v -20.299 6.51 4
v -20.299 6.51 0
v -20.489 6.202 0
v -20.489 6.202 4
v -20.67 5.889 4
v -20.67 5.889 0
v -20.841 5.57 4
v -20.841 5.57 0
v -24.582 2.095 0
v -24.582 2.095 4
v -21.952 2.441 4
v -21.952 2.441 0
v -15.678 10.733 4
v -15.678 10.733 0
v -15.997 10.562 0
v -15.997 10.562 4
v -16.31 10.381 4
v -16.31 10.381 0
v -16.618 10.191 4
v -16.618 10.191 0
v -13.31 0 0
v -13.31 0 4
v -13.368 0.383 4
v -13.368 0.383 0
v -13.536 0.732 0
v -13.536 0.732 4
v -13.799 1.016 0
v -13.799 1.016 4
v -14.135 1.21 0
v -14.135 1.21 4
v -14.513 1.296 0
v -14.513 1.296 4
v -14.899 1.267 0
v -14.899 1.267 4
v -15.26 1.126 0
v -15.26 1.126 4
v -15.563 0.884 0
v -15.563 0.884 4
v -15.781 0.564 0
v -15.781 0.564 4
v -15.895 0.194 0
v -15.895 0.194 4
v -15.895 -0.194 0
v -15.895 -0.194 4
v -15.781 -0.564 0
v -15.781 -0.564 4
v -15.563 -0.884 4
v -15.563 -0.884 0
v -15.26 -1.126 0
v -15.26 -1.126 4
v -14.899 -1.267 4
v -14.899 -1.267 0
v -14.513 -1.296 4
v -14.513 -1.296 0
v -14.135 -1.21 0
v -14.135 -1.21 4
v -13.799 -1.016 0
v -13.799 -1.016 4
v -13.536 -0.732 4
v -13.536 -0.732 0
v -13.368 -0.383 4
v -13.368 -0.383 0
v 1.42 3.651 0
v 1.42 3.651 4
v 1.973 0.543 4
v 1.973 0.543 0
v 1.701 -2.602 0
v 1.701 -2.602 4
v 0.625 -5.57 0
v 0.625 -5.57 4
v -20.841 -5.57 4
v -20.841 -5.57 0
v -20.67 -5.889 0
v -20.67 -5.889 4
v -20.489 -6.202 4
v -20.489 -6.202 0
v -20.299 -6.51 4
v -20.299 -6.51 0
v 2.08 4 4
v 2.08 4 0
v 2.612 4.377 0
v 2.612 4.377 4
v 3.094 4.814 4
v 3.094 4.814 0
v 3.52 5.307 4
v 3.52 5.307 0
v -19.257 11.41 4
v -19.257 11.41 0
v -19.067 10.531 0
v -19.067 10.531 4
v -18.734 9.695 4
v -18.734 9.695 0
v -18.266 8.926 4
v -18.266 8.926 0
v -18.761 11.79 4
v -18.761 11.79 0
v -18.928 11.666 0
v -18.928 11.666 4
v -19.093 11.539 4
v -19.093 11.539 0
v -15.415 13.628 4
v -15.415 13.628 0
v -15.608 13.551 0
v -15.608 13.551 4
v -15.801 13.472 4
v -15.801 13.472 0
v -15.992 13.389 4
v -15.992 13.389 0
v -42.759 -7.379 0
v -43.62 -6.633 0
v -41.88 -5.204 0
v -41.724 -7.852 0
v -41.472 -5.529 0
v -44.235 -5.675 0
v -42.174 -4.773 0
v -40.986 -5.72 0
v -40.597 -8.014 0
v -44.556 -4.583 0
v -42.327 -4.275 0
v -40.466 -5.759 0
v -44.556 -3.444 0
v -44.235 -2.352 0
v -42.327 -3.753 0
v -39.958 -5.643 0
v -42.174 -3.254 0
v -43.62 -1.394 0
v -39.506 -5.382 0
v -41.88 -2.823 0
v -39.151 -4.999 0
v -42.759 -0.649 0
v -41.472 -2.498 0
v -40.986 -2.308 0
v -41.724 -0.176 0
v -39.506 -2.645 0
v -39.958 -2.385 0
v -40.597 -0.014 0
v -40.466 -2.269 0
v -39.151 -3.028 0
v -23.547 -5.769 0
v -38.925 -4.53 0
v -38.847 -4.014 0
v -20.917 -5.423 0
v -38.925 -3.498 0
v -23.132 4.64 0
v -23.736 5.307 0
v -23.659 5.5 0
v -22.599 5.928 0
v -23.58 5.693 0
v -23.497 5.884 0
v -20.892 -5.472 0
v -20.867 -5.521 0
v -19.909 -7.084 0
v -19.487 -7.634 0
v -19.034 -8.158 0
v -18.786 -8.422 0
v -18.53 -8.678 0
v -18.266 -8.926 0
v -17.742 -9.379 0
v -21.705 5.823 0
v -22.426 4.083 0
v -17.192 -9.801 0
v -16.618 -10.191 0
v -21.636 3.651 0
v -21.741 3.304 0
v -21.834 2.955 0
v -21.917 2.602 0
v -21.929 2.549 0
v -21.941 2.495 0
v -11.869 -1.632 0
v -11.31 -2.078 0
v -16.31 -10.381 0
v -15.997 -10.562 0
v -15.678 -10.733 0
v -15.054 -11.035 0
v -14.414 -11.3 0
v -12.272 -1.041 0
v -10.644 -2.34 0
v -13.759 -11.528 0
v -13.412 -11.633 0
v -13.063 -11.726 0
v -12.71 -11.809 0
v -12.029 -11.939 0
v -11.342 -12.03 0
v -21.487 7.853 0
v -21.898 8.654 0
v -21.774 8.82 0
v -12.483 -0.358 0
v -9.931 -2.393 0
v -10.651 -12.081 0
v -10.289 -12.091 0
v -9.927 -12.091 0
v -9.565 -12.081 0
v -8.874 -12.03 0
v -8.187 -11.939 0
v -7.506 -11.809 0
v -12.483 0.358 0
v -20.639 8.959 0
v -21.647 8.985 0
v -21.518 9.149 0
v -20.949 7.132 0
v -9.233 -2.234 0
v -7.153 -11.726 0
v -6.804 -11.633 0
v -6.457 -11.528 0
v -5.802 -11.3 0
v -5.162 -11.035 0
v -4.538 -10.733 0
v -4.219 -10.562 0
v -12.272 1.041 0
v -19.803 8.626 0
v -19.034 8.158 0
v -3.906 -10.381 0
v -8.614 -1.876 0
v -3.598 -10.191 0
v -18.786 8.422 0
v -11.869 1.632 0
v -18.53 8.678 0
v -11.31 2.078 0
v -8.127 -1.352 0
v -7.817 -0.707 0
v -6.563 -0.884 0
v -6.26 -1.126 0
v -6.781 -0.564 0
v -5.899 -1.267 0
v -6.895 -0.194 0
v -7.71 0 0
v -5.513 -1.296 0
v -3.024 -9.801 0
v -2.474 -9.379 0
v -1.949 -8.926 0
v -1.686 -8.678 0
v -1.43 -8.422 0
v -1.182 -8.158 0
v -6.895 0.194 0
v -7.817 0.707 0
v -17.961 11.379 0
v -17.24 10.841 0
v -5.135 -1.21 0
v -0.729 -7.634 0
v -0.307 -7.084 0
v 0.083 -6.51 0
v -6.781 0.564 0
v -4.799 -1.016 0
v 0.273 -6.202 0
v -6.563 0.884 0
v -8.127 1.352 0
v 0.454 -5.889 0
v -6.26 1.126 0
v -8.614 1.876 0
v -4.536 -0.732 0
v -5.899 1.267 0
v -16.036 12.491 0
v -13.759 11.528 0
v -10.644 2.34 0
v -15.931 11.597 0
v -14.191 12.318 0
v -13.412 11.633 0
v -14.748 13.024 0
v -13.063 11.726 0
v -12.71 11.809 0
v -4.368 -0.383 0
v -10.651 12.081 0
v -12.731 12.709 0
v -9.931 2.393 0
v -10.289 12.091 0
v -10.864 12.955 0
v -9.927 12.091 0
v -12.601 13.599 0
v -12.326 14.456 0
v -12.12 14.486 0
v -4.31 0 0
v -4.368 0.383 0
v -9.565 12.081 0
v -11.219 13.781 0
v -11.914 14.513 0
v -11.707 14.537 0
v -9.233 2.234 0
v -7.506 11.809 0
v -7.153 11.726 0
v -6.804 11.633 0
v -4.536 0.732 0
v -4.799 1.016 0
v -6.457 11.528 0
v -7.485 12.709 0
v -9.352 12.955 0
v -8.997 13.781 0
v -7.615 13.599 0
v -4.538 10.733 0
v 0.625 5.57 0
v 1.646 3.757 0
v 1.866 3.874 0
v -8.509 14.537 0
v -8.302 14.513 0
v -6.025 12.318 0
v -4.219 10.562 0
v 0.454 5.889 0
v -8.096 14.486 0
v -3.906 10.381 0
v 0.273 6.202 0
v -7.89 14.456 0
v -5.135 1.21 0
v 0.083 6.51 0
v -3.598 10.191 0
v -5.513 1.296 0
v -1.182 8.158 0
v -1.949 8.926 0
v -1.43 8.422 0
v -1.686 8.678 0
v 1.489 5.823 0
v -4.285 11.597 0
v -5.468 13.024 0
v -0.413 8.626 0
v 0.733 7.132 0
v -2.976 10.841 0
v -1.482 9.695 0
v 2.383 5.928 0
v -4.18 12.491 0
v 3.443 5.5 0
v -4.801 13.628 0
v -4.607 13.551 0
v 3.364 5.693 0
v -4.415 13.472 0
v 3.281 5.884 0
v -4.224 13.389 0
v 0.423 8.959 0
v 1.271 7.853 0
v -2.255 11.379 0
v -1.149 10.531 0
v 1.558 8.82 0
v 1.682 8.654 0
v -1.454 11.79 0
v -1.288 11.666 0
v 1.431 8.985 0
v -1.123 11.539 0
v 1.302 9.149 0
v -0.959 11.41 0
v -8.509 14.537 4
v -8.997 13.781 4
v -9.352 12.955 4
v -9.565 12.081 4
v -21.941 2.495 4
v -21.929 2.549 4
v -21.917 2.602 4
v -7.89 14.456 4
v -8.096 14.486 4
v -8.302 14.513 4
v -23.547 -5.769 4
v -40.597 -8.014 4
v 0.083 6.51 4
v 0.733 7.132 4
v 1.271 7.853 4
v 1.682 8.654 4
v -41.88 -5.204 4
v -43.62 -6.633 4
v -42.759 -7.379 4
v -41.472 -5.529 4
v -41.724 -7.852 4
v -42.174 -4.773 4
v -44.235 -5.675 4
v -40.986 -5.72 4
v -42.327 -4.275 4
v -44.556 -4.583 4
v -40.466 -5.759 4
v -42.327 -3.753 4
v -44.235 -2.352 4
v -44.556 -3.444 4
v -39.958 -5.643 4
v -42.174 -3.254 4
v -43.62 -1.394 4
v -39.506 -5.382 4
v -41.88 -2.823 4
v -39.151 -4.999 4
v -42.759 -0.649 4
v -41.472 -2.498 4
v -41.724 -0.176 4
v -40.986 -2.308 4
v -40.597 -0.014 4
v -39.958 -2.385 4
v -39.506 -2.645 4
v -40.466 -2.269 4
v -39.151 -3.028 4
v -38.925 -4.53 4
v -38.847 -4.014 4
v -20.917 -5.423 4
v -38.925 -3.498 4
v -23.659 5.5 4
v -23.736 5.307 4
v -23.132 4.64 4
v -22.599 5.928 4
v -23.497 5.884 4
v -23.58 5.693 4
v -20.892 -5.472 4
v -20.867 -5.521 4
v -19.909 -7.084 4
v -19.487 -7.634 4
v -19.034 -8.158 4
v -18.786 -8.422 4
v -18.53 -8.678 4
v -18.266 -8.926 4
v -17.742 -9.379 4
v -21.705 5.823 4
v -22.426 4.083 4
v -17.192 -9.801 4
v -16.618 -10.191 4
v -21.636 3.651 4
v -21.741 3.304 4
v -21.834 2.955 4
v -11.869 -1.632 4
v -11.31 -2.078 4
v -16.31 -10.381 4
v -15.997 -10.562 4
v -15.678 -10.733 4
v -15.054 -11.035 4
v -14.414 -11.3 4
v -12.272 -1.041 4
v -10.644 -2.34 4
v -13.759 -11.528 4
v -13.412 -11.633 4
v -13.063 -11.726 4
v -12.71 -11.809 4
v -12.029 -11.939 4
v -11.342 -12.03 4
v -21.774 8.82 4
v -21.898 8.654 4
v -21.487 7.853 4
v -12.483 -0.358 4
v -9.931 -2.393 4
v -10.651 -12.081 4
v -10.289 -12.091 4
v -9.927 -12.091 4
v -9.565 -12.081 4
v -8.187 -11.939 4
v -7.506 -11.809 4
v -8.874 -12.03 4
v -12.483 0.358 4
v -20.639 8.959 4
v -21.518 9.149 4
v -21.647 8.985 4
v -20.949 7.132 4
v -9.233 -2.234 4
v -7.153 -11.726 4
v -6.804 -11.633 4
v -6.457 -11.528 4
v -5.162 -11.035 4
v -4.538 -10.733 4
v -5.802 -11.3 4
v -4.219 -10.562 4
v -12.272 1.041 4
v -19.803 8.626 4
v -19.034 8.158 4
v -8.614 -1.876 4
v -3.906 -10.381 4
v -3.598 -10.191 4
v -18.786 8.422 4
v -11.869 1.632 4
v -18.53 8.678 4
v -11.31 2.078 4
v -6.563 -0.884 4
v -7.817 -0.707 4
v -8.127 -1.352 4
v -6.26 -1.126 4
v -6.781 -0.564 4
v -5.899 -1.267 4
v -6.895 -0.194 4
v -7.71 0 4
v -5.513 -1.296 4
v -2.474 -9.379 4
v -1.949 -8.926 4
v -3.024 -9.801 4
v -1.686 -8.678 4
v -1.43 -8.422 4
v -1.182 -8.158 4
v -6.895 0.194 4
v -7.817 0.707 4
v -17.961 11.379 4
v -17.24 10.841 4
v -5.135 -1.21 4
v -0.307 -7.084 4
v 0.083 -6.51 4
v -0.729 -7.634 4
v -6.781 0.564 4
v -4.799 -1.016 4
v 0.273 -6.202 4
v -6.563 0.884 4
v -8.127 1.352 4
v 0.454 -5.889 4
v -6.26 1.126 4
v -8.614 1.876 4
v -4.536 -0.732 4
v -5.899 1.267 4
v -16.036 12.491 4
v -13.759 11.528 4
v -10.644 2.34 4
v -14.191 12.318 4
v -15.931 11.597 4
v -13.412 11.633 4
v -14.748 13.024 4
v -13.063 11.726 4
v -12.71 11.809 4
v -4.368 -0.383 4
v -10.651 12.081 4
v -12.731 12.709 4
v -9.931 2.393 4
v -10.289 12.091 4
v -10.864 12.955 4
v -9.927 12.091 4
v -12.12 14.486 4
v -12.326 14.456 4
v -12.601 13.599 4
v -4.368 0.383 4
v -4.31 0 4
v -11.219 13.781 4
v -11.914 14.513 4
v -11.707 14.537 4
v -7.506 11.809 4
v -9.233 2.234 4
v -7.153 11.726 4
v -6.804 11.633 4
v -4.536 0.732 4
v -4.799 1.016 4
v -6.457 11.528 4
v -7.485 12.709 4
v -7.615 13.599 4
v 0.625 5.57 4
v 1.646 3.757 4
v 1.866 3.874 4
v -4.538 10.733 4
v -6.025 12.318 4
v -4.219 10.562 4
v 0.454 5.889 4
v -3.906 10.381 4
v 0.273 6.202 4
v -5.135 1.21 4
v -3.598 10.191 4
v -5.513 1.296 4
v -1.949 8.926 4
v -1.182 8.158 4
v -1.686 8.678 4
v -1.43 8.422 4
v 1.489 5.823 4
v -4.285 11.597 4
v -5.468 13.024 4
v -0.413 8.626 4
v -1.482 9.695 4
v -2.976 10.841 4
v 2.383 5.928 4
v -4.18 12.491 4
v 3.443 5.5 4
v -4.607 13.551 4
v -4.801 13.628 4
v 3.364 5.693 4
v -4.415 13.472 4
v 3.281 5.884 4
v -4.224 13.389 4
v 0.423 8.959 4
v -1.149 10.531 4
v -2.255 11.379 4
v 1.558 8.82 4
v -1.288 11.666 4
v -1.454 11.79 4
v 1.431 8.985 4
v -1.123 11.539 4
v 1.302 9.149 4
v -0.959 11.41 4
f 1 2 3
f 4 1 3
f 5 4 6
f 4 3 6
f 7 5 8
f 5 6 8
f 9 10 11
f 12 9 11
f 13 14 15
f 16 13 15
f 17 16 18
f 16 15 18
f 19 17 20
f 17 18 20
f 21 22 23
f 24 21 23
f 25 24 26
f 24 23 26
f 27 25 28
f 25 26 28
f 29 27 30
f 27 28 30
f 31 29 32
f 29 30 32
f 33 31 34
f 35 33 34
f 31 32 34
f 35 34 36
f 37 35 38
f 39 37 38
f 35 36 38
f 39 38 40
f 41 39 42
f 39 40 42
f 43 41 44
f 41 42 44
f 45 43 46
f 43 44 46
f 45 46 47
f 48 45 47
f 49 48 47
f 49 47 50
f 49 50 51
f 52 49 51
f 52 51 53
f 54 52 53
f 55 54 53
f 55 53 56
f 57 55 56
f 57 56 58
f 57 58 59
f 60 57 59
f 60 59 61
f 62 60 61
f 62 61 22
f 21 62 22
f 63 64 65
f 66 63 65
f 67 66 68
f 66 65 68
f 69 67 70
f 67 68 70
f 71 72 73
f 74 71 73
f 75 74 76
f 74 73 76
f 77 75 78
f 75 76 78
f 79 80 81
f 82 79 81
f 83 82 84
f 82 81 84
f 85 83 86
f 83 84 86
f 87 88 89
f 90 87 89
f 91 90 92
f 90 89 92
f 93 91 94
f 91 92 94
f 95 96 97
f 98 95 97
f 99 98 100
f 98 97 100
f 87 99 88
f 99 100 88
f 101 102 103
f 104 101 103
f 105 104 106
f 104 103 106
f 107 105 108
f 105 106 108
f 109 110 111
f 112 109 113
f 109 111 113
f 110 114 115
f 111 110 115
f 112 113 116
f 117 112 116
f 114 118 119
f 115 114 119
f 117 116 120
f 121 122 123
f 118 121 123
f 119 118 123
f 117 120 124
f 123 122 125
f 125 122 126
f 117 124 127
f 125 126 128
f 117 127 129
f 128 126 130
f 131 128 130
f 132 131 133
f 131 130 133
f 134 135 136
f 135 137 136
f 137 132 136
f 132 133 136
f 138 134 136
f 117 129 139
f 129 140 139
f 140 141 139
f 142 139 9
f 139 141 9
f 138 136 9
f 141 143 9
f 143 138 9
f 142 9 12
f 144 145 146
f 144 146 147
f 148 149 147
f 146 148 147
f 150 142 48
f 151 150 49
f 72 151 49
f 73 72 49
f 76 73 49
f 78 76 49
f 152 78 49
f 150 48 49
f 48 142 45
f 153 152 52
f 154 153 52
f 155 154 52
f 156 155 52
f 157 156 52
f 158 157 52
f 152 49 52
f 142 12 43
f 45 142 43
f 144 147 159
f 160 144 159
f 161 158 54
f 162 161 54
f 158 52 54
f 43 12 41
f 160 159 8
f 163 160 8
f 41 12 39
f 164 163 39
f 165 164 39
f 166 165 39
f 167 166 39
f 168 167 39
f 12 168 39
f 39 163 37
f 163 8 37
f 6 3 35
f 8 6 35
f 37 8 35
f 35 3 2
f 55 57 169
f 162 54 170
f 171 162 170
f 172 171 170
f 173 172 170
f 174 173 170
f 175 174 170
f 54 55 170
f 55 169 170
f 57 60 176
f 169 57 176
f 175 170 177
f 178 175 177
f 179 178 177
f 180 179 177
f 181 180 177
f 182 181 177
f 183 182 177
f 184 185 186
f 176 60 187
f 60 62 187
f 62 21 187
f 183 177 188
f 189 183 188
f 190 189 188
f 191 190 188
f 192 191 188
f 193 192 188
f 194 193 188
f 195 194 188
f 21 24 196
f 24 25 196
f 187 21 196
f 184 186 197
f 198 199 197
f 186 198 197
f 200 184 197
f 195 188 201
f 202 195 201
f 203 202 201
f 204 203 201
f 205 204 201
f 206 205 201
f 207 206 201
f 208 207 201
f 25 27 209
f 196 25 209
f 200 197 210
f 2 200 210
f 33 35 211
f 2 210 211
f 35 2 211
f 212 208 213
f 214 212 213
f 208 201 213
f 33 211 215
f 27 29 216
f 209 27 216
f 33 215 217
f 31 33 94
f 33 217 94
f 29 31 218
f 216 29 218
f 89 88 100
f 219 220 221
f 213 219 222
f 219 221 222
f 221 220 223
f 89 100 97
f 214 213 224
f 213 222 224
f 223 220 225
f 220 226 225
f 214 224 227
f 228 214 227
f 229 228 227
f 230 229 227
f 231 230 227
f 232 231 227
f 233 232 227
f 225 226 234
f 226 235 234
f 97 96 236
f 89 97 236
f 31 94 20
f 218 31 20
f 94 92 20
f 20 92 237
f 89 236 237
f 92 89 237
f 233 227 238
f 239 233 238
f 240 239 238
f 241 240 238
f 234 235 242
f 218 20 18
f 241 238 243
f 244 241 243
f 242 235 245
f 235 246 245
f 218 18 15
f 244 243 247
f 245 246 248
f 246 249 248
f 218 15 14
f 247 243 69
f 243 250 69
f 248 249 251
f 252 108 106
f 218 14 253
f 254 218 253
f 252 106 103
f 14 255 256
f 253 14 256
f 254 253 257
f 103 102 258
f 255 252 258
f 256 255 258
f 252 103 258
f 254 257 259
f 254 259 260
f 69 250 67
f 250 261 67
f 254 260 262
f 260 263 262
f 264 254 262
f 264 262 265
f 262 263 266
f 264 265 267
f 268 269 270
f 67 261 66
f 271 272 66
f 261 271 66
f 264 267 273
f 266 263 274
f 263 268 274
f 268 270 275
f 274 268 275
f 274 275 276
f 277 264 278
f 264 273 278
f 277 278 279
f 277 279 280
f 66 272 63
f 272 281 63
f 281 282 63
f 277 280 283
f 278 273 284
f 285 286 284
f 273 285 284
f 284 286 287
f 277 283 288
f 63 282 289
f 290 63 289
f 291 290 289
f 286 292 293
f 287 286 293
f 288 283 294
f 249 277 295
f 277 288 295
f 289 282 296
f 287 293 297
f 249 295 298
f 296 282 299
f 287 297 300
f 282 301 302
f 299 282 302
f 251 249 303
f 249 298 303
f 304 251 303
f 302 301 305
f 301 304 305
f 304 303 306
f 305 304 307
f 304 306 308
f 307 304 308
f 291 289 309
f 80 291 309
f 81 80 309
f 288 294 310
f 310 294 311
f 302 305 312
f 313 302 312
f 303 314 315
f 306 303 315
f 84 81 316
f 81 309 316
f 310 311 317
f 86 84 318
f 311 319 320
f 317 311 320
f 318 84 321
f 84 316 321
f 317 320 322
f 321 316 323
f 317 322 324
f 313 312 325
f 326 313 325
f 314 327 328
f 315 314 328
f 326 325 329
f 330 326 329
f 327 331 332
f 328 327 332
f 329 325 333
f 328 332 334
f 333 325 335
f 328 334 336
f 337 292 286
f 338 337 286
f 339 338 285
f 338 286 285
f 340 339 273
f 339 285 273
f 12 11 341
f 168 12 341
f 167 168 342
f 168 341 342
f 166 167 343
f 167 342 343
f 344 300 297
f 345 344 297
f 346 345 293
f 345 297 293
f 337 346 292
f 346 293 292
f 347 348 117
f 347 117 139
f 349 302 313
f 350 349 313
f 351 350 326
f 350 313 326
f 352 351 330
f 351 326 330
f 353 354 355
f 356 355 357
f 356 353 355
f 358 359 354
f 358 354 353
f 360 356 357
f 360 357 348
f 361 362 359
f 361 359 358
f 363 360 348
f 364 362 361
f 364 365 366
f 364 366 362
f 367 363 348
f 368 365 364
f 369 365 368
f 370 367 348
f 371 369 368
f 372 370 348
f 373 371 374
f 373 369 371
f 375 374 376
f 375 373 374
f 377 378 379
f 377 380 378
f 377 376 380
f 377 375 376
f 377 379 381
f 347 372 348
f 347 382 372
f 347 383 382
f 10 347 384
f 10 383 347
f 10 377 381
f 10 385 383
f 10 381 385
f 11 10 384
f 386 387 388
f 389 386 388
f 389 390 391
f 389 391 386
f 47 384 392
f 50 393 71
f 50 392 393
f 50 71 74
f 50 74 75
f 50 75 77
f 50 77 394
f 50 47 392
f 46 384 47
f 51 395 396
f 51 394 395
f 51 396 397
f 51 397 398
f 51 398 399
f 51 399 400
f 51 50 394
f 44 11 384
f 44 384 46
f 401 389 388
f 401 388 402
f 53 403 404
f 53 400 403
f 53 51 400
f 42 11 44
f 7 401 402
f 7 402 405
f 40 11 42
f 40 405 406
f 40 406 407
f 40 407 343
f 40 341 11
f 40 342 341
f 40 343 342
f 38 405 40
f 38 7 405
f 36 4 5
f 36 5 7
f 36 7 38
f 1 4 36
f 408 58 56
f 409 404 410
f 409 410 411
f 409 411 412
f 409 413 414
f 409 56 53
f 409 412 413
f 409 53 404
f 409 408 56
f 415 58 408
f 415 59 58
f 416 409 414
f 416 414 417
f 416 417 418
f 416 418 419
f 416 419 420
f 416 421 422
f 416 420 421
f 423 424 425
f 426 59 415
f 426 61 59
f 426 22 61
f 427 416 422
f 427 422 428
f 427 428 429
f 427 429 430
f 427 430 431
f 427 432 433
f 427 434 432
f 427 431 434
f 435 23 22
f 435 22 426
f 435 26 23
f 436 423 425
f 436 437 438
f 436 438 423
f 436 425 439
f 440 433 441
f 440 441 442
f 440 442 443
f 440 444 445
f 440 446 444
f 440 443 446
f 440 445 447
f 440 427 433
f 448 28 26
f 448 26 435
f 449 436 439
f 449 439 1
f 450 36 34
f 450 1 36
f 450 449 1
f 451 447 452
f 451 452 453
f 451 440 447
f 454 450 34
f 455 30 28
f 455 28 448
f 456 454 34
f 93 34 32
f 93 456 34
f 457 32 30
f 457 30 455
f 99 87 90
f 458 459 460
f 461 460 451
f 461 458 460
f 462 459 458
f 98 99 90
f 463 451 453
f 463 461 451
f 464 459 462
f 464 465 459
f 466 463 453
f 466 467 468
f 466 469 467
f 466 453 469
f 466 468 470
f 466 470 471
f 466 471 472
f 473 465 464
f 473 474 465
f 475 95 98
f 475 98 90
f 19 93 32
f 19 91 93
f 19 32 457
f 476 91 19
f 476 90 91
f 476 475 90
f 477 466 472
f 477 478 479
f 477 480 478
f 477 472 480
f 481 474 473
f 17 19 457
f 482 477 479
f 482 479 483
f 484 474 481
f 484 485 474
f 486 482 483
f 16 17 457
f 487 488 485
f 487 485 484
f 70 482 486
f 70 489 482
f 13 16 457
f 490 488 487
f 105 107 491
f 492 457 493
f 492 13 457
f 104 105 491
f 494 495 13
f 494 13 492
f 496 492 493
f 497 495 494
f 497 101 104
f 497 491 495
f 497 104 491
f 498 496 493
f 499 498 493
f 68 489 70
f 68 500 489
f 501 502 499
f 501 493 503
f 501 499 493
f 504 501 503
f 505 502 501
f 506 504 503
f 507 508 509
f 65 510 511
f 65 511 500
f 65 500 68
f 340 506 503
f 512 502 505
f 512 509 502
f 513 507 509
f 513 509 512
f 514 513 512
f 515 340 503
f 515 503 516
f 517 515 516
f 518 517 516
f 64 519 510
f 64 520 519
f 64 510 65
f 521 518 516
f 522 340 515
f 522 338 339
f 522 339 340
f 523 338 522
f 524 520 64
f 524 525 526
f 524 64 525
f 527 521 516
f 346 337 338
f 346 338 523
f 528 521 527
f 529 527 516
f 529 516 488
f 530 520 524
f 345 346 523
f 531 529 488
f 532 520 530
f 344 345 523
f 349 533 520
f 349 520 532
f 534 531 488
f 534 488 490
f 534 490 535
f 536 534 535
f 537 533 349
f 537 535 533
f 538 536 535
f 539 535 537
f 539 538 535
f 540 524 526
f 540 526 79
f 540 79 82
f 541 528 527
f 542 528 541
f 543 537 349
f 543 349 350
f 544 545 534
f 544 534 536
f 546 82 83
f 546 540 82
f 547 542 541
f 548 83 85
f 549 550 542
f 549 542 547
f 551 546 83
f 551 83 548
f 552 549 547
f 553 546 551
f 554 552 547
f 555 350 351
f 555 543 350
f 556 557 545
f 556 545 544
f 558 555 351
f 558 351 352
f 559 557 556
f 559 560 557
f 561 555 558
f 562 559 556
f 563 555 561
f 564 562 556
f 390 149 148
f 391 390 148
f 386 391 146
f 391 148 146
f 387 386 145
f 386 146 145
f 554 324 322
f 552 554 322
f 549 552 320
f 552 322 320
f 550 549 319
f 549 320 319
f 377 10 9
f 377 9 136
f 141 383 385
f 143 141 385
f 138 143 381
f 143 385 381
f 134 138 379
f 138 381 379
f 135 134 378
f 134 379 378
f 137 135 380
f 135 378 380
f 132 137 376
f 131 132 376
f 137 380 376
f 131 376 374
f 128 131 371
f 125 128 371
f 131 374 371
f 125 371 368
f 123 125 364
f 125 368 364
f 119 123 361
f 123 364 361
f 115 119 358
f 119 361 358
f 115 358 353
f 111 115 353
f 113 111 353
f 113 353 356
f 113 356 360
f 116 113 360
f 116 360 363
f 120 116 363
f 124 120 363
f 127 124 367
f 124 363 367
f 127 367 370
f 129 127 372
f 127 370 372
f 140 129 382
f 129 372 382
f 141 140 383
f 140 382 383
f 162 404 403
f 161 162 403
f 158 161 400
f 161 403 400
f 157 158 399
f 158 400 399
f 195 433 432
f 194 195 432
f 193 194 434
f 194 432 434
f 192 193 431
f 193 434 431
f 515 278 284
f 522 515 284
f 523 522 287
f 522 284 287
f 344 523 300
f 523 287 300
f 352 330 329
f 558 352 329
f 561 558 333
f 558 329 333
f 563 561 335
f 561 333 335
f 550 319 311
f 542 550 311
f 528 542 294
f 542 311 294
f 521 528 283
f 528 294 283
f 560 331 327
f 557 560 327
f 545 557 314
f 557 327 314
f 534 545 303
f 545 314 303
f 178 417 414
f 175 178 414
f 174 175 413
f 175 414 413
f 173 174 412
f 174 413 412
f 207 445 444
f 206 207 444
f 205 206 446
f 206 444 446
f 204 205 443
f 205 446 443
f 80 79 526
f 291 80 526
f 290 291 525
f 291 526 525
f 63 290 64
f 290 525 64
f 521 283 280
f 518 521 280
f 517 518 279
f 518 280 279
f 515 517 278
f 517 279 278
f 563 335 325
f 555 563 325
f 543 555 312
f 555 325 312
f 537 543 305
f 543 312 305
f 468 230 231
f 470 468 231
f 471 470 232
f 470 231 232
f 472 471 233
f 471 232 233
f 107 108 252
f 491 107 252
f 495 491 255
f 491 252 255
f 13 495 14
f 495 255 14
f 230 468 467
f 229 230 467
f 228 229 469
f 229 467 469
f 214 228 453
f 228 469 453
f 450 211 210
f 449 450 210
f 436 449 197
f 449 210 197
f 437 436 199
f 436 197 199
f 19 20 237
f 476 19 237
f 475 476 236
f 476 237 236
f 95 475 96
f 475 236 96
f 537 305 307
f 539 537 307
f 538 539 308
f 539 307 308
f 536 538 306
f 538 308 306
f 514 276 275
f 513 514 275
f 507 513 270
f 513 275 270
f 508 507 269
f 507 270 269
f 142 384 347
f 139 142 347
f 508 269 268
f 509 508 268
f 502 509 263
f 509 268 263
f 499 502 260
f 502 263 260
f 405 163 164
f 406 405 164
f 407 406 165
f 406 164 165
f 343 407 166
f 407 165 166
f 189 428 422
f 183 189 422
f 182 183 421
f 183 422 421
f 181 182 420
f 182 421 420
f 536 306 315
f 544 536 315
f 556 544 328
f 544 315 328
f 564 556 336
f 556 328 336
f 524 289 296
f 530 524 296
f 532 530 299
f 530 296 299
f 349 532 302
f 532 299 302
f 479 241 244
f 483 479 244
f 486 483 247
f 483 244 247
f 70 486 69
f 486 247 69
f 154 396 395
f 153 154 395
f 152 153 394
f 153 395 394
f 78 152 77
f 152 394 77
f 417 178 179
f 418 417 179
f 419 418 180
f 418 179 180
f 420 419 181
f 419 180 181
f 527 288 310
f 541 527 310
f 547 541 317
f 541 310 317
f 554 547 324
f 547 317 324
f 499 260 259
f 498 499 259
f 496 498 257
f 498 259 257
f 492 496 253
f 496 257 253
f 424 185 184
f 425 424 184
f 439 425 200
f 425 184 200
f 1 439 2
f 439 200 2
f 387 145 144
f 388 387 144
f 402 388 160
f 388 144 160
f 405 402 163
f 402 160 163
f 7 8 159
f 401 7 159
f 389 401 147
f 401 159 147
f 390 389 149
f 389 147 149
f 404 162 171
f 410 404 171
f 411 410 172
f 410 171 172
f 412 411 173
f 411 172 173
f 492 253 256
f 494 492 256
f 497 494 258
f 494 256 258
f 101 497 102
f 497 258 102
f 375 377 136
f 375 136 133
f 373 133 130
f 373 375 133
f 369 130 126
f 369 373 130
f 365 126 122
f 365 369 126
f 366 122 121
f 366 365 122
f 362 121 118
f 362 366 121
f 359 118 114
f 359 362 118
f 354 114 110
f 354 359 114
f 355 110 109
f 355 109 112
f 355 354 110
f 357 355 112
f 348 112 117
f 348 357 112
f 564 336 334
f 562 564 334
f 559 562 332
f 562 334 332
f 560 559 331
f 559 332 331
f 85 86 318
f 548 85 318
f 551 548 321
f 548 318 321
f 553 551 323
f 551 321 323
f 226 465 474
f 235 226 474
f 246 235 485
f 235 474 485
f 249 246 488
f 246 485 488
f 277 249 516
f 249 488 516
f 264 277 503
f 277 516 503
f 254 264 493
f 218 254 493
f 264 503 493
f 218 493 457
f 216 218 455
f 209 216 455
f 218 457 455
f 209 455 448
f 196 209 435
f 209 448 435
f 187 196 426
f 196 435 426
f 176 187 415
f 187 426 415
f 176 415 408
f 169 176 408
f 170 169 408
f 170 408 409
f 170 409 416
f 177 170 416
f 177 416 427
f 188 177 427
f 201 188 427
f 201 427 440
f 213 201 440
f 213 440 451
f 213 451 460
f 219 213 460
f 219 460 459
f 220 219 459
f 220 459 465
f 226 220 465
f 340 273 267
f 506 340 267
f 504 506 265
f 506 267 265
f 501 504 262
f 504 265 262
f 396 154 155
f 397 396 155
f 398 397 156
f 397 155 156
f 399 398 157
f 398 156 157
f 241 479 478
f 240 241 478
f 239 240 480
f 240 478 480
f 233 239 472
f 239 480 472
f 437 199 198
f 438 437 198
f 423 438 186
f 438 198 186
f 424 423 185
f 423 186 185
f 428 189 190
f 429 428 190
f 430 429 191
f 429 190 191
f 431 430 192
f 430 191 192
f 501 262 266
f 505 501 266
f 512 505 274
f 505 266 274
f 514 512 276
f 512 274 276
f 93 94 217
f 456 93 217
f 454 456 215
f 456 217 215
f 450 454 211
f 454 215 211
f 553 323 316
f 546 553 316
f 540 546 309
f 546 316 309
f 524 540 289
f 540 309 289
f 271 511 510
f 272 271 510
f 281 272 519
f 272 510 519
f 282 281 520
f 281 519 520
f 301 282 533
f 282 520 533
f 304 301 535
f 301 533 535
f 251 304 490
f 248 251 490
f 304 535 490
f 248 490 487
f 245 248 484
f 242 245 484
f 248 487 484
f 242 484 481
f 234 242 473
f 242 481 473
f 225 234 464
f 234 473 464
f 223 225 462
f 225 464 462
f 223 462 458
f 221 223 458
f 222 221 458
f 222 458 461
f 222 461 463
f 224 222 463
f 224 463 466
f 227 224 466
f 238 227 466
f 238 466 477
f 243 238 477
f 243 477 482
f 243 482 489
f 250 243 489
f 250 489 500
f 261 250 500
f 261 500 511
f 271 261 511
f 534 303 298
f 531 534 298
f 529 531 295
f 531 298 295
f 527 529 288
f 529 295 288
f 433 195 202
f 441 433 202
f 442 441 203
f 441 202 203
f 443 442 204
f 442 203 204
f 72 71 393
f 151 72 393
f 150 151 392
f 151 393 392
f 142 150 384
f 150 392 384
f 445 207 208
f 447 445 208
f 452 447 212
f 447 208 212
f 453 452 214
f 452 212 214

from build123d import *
from build123d.topology import SkipClean

# Parameters (mm, degrees)
SKETCH1_R           = 1.5
BOSS_EXTRUDE1_DEPTH = 4
SKETCH2_R           = 1.75
BOSS_EXTRUDE2_DEPTH = 4
CUT_EXTRUDE1_DEPTH  = 48.07674207
SKETCH4_R           = 2.4
SKETCH4_R_2         = 1.3
CUT_EXTRUDE2_DEPTH  = 48.07674207


with BuildPart() as part:
    # Sketch1 → Boss-Extrude1 (new body)
    with BuildSketch(Plane.XY):
        with BuildLine():
            Line((20.64, 4), (2.08, 4))
            ThreePointArc((2.08, 4), (2.859386397, 4.588201733), (3.5201075, 5.30713988))
            ThreePointArc((3.5201075, 5.30713988), (3.403753673, 5.596745198), (3.281246369, 5.883801663))
            ThreePointArc((3.281246369, 5.883801663), (1.933634043, 5.894040025), (0.625453025, 5.57027124))
            ThreePointArc((0.625453025, 5.57027124), (0.364644212, 6.046375), (0.082730667, 6.510293938))
            ThreePointArc((0.082730667, 6.510293938), (1.017213169, 7.48132754), (1.68215265, 8.65351323))
            ThreePointArc((1.68215265, 8.65351323), (1.494808112, 8.903135899), (1.302179463, 9.148703928))
            ThreePointArc((1.302179463, 9.148703928), (-0.002163969, 8.809805691), (-1.181972273, 8.158486898))
            ThreePointArc((-1.181972273, 8.158486898), (-1.557118962, 8.550865528), (-1.949497592, 8.926012217))
            ThreePointArc((-1.949497592, 8.926012217), (-1.298178799, 10.105820521), (-0.959280562, 11.410163953))
            ThreePointArc((-0.959280562, 11.410163953), (-1.204848591, 11.602792602), (-1.45447126, 11.79013714))
            ThreePointArc((-1.45447126, 11.79013714), (-2.62665695, 11.125197659), (-3.597690552, 10.190715157))
            ThreePointArc((-3.597690552, 10.190715157), (-4.06160949, 10.472628702), (-4.53771325, 10.733437515))
            ThreePointArc((-4.53771325, 10.733437515), (-4.213944465, 12.041618533), (-4.224182827, 13.389230859))
            ThreePointArc((-4.224182827, 13.389230859), (-4.511239292, 13.511738163), (-4.80084461, 13.62809199))
            ThreePointArc((-4.80084461, 13.62809199), (-5.760990039, 12.682425791), (-6.457074605, 11.528463019))
            ThreePointArc((-6.457074605, 11.528463019), (-6.978150482, 11.680699536), (-7.505533688, 11.809396783))
            ThreePointArc((-7.505533688, 11.809396783), (-7.531379219, 13.156800143), (-7.890056453, 14.455843809))
            ThreePointArc((-7.890056453, 14.455843809), (-8.199038929, 14.499881098), (-8.508890771, 14.537314892))
            ThreePointArc((-8.508890771, 14.537314892), (-9.191563616, 13.375367565), (-9.565262132, 12.080565177))
            ThreePointArc((-9.565262132, 12.080565177), (-10.10798449, 12.09275), (-10.650706848, 12.080565177))
            ThreePointArc((-10.650706848, 12.080565177), (-11.024405364, 13.375367565), (-11.707078209, 14.537314892))
            ThreePointArc((-11.707078209, 14.537314892), (-12.016930051, 14.499881098), (-12.325912527, 14.455843809))
            ThreePointArc((-12.325912527, 14.455843809), (-12.684589761, 13.156800143), (-12.710435292, 11.809396783))
            ThreePointArc((-12.710435292, 11.809396783), (-13.237818498, 11.680699536), (-13.758894375, 11.528463019))
            ThreePointArc((-13.758894375, 11.528463019), (-14.454978941, 12.682425791), (-15.41512437, 13.62809199))
            ThreePointArc((-15.41512437, 13.62809199), (-15.704729688, 13.511738163), (-15.991786153, 13.389230859))
            ThreePointArc((-15.991786153, 13.389230859), (-16.002024515, 12.041618533), (-15.67825573, 10.733437515))
            ThreePointArc((-15.67825573, 10.733437515), (-16.15435949, 10.472628702), (-16.618278428, 10.190715157))
            ThreePointArc((-16.618278428, 10.190715157), (-17.58931203, 11.125197659), (-18.76149772, 11.79013714))
            ThreePointArc((-18.76149772, 11.79013714), (-19.011120389, 11.602792602), (-19.256688418, 11.410163953))
            ThreePointArc((-19.256688418, 11.410163953), (-18.917790181, 10.105820521), (-18.266471388, 8.926012217))
            ThreePointArc((-18.266471388, 8.926012217), (-18.658850018, 8.550865528), (-19.033996707, 8.158486898))
            ThreePointArc((-19.033996707, 8.158486898), (-20.213805011, 8.809805691), (-21.518148443, 9.148703928))
            ThreePointArc((-21.518148443, 9.148703928), (-21.710777092, 8.903135899), (-21.89812163, 8.65351323))
            ThreePointArc((-21.89812163, 8.65351323), (-21.233182149, 7.48132754), (-20.298699647, 6.510293938))
            ThreePointArc((-20.298699647, 6.510293938), (-20.580613192, 6.046375), (-20.841422005, 5.57027124))
            ThreePointArc((-20.841422005, 5.57027124), (-22.149603023, 5.894040025), (-23.497215349, 5.883801663))
            ThreePointArc((-23.497215349, 5.883801663), (-23.619722653, 5.596745198), (-23.73607648, 5.30713988))
            ThreePointArc((-23.73607648, 5.30713988), (-22.790410282, 4.346994451), (-21.636447509, 3.650909885))
            ThreePointArc((-21.636447509, 3.650909885), (-21.788684026, 3.129834008), (-21.917381273, 2.602450802))
            ThreePointArc((-21.917381273, 2.602450802), (-23.264784633, 2.576605271), (-24.563828299, 2.217928037))
            ThreePointArc((-24.563828299, 2.217928037), (-24.607865588, 1.908945561), (-24.645299382, 1.599093719))
            ThreePointArc((-24.645299382, 1.599093719), (-23.483352055, 0.916420874), (-22.188549667, 0.542722358))
            ThreePointArc((-22.188549667, 0.542722358), (-22.20073449, 0), (-22.188549667, -0.542722358))
            ThreePointArc((-22.188549667, -0.542722358), (-23.483352055, -0.916420874), (-24.645299382, -1.599093719))
            ThreePointArc((-24.645299382, -1.599093719), (-24.607865588, -1.908945561), (-24.563828299, -2.217928037))
            ThreePointArc((-24.563828299, -2.217928037), (-23.264784633, -2.576605271), (-21.917381273, -2.602450802))
            ThreePointArc((-21.917381273, -2.602450802), (-21.788684026, -3.129834008), (-21.636447509, -3.650909885))
            ThreePointArc((-21.636447509, -3.650909885), (-22.790410282, -4.346994451), (-23.73607648, -5.30713988))
            ThreePointArc((-23.73607648, -5.30713988), (-23.619722653, -5.596745198), (-23.497215349, -5.883801663))
            ThreePointArc((-23.497215349, -5.883801663), (-22.149603023, -5.894040025), (-20.841422005, -5.57027124))
            ThreePointArc((-20.841422005, -5.57027124), (-20.580613192, -6.046375), (-20.298699647, -6.510293938))
            ThreePointArc((-20.298699647, -6.510293938), (-21.233182149, -7.48132754), (-21.89812163, -8.65351323))
            ThreePointArc((-21.89812163, -8.65351323), (-21.710777092, -8.903135899), (-21.518148443, -9.148703928))
            ThreePointArc((-21.518148443, -9.148703928), (-20.213805011, -8.809805691), (-19.033996707, -8.158486898))
            ThreePointArc((-19.033996707, -8.158486898), (-18.658850018, -8.550865528), (-18.266471388, -8.926012217))
            ThreePointArc((-18.266471388, -8.926012217), (-18.917790181, -10.105820521), (-19.256688418, -11.410163953))
            ThreePointArc((-19.256688418, -11.410163953), (-19.011120389, -11.602792602), (-18.76149772, -11.79013714))
            ThreePointArc((-18.76149772, -11.79013714), (-17.58931203, -11.125197659), (-16.618278428, -10.190715157))
            ThreePointArc((-16.618278428, -10.190715157), (-16.15435949, -10.472628702), (-15.67825573, -10.733437515))
            ThreePointArc((-15.67825573, -10.733437515), (-16.002024515, -12.041618533), (-15.991786153, -13.389230859))
            ThreePointArc((-15.991786153, -13.389230859), (-15.704729688, -13.511738163), (-15.41512437, -13.62809199))
            ThreePointArc((-15.41512437, -13.62809199), (-14.454978941, -12.682425791), (-13.758894375, -11.528463019))
            ThreePointArc((-13.758894375, -11.528463019), (-13.237818498, -11.680699536), (-12.710435292, -11.809396783))
            ThreePointArc((-12.710435292, -11.809396783), (-12.684589761, -13.156800143), (-12.325912527, -14.455843809))
            ThreePointArc((-12.325912527, -14.455843809), (-12.016930051, -14.499881098), (-11.707078209, -14.537314892))
            ThreePointArc((-11.707078209, -14.537314892), (-11.024405364, -13.375367565), (-10.650706848, -12.080565177))
            ThreePointArc((-10.650706848, -12.080565177), (-10.10798449, -12.09275), (-9.565262132, -12.080565177))
            ThreePointArc((-9.565262132, -12.080565177), (-9.191563616, -13.375367565), (-8.508890771, -14.537314892))
            ThreePointArc((-8.508890771, -14.537314892), (-8.199038929, -14.499881098), (-7.890056453, -14.455843809))
            ThreePointArc((-7.890056453, -14.455843809), (-7.531379219, -13.156800143), (-7.505533688, -11.809396783))
            ThreePointArc((-7.505533688, -11.809396783), (-6.978150482, -11.680699536), (-6.457074605, -11.528463019))
            ThreePointArc((-6.457074605, -11.528463019), (-5.760990039, -12.682425791), (-4.80084461, -13.62809199))
            ThreePointArc((-4.80084461, -13.62809199), (-4.511239292, -13.511738163), (-4.224182827, -13.389230859))
            ThreePointArc((-4.224182827, -13.389230859), (-4.213944465, -12.041618533), (-4.53771325, -10.733437515))
            ThreePointArc((-4.53771325, -10.733437515), (-4.06160949, -10.472628702), (-3.597690552, -10.190715157))
            ThreePointArc((-3.597690552, -10.190715157), (-2.62665695, -11.125197659), (-1.45447126, -11.79013714))
            ThreePointArc((-1.45447126, -11.79013714), (-1.204848591, -11.602792602), (-0.959280562, -11.410163953))
            ThreePointArc((-0.959280562, -11.410163953), (-1.298178799, -10.105820521), (-1.949497592, -8.926012217))
            ThreePointArc((-1.949497592, -8.926012217), (-1.557118962, -8.550865528), (-1.181972273, -8.158486898))
            ThreePointArc((-1.181972273, -8.158486898), (-0.002163969, -8.809805691), (1.302179463, -9.148703928))
            ThreePointArc((1.302179463, -9.148703928), (1.494808112, -8.903135899), (1.68215265, -8.65351323))
            ThreePointArc((1.68215265, -8.65351323), (1.017213169, -7.48132754), (0.082730667, -6.510293938))
            ThreePointArc((0.082730667, -6.510293938), (0.364644212, -6.046375), (0.625453025, -5.57027124))
            ThreePointArc((0.625453025, -5.57027124), (1.933634043, -5.894040025), (3.281246369, -5.883801663))
            ThreePointArc((3.281246369, -5.883801663), (3.403753673, -5.596745198), (3.5201075, -5.30713988))
            ThreePointArc((3.5201075, -5.30713988), (2.859386397, -4.588201733), (2.08, -4))
            Line((2.08, -4), (20.64, -4))
            ThreePointArc((20.64, -4), (24.64, 0), (20.64, 4))
        make_face()
        with Locations((-10.11, 0)):
            Circle(SKETCH1_R, mode=Mode.SUBTRACT)
        with Locations((20.64, 0)):
            Circle(SKETCH1_R, mode=Mode.SUBTRACT)
    extrude(amount=BOSS_EXTRUDE1_DEPTH)

    # Sketch2 → Boss-Extrude2 (add)
    with BuildSketch(Plane.XY.offset(4)):
        with BuildLine():
            ThreePointArc((-10.11, -4), (-14.075779445, -0.522104769), (-11.14527618, 3.863703305))
            Line((-11.14527618, 3.863703305), (-40.596929487, -0.013680411))
            ThreePointArc((-40.596929487, -0.013680411), (-44.596929487, -4.013680411), (-40.596929487, -8.013680411))
            Line((-40.596929487, -8.013680411), (-10.11, -4))
        make_face()
        with Locations((-40.596929487, -4.013680411)):
            Circle(SKETCH2_R, mode=Mode.SUBTRACT)
    extrude(amount=-BOSS_EXTRUDE2_DEPTH)

    # Sketch3 → Cut-Extrude1 (cut, through all)
    with SkipClean():  # the faces are left unmerged after this step: merging them gives an invalid solid
        with BuildSketch(Plane.XY.offset(4)):
            with BuildLine():
                ThreePointArc((-24.563828299, 2.217928037), (-24.573144452, 2.156333064), (-24.582198156, 2.094698967))
                Line((-24.582198156, 2.094698967), (-21.951807297, 2.440996493))
                ThreePointArc((-21.951807297, 2.440996493), (-21.934869799, 2.521782394), (-21.917381273, 2.602450802))
                ThreePointArc((-21.917381273, 2.602450802), (-23.264784633, 2.576605271), (-24.563828299, 2.217928037))
            make_face()
            with BuildLine():
                ThreePointArc((-20.841422005, -5.57027124), (-20.879319726, -5.496629859), (-20.916712206, -5.422730653))
                Line((-20.916712206, -5.422730653), (-23.547068935, -5.769023686))
                ThreePointArc((-23.547068935, -5.769023686), (-23.522264903, -5.826465995), (-23.497215349, -5.883801663))
                ThreePointArc((-23.497215349, -5.883801663), (-22.149603023, -5.894040025), (-20.841422005, -5.57027124))
            make_face()
            with BuildLine():
                ThreePointArc((1.420478529, 3.650909885), (1.94006926, -1.03875088), (0.625453025, -5.57027124))
                ThreePointArc((0.625453025, -5.57027124), (1.933634043, -5.894040025), (3.281246369, -5.883801663))
                ThreePointArc((3.281246369, -5.883801663), (3.403753673, -5.596745198), (3.5201075, -5.30713988))
                ThreePointArc((3.5201075, -5.30713988), (2.859386397, -4.588201733), (2.08, -4))
                Line((2.08, -4), (20.64, -4))
                ThreePointArc((20.64, -4), (24.64, 0), (20.64, 4))
                Line((20.64, 4), (2.08, 4))
                ThreePointArc((2.08, 4), (1.756276461, 3.814049117), (1.420478529, 3.650909885))
            make_face()
            with BuildLine():
                ThreePointArc((0.082730667, -6.510293938), (-0.514160884, -7.361599771), (-1.181972273, -8.158486898))
                ThreePointArc((-1.181972273, -8.158486898), (-0.002163969, -8.809805691), (1.302179463, -9.148703928))
                ThreePointArc((1.302179463, -9.148703928), (1.494808112, -8.903135899), (1.68215265, -8.65351323))
                ThreePointArc((1.68215265, -8.65351323), (1.017213169, -7.48132754), (0.082730667, -6.510293938))
            make_face()
            with BuildLine():
                ThreePointArc((-1.949497592, -8.926012217), (-2.746384719, -9.593823606), (-3.597690552, -10.190715157))
                ThreePointArc((-3.597690552, -10.190715157), (-2.62665695, -11.125197659), (-1.45447126, -11.79013714))
                ThreePointArc((-1.45447126, -11.79013714), (-1.204848591, -11.602792602), (-0.959280562, -11.410163953))
                ThreePointArc((-0.959280562, -11.410163953), (-1.298178799, -10.105820521), (-1.949497592, -8.926012217))
            make_face()
            with BuildLine():
                ThreePointArc((-4.53771325, -10.733437515), (-5.480289413, -11.172244217), (-6.457074605, -11.528463019))
                ThreePointArc((-6.457074605, -11.528463019), (-5.760990039, -12.682425791), (-4.80084461, -13.62809199))
                ThreePointArc((-4.80084461, -13.62809199), (-4.511239292, -13.511738163), (-4.224182827, -13.389230859))
                ThreePointArc((-4.224182827, -13.389230859), (-4.213944465, -12.041618533), (-4.53771325, -10.733437515))
            make_face()
            with BuildLine():
                ThreePointArc((-7.505533688, -11.809396783), (-8.529563879, -11.989294847), (-9.565262132, -12.080565177))
                ThreePointArc((-9.565262132, -12.080565177), (-9.191563616, -13.375367565), (-8.508890771, -14.537314892))
                ThreePointArc((-8.508890771, -14.537314892), (-8.199038929, -14.499881098), (-7.890056453, -14.455843809))
                ThreePointArc((-7.890056453, -14.455843809), (-7.531379219, -13.156800143), (-7.505533688, -11.809396783))
            make_face()
            with BuildLine():
                ThreePointArc((-10.650706848, -12.080565177), (-11.686405101, -11.989294847), (-12.710435292, -11.809396783))
                ThreePointArc((-12.710435292, -11.809396783), (-12.684589761, -13.156800143), (-12.325912527, -14.455843809))
                ThreePointArc((-12.325912527, -14.455843809), (-12.016930051, -14.499881098), (-11.707078209, -14.537314892))
                ThreePointArc((-11.707078209, -14.537314892), (-11.024405364, -13.375367565), (-10.650706848, -12.080565177))
            make_face()
            with BuildLine():
                ThreePointArc((-13.758894375, -11.528463019), (-14.735679567, -11.172244217), (-15.67825573, -10.733437515))
                ThreePointArc((-15.67825573, -10.733437515), (-16.002024515, -12.041618533), (-15.991786153, -13.389230859))
                ThreePointArc((-15.991786153, -13.389230859), (-15.704729688, -13.511738163), (-15.41512437, -13.62809199))
                ThreePointArc((-15.41512437, -13.62809199), (-14.454978941, -12.682425791), (-13.758894375, -11.528463019))
            make_face()
            with BuildLine():
                ThreePointArc((-16.618278428, -10.190715157), (-17.469584261, -9.593823606), (-18.266471388, -8.926012217))
                ThreePointArc((-18.266471388, -8.926012217), (-18.917790181, -10.105820521), (-19.256688418, -11.410163953))
                ThreePointArc((-19.256688418, -11.410163953), (-19.011120389, -11.602792602), (-18.76149772, -11.79013714))
                ThreePointArc((-18.76149772, -11.79013714), (-17.58931203, -11.125197659), (-16.618278428, -10.190715157))
            make_face()
            with BuildLine():
                ThreePointArc((-19.033996707, -8.158486898), (-19.701808096, -7.361599771), (-20.298699647, -6.510293938))
                ThreePointArc((-20.298699647, -6.510293938), (-21.233182149, -7.48132754), (-21.89812163, -8.65351323))
                ThreePointArc((-21.89812163, -8.65351323), (-21.710777092, -8.903135899), (-21.518148443, -9.148703928))
                ThreePointArc((-21.518148443, -9.148703928), (-20.213805011, -8.809805691), (-19.033996707, -8.158486898))
            make_face()
        extrude(amount=-CUT_EXTRUDE1_DEPTH, mode=Mode.SUBTRACT)

    # Sketch4 → Cut-Extrude2 (cut, through all)
    with SkipClean():  # the faces are left unmerged after this step: merging them gives an invalid solid
        with BuildSketch(Plane.XY.offset(4)):
            with Locations((-10.11, 0)):
                Circle(SKETCH4_R)
            with Locations((-5.61, 0)):
                Circle(SKETCH4_R_2)
            with Locations((-14.61, 0)):
                Circle(SKETCH4_R_2)
        extrude(amount=-CUT_EXTRUDE2_DEPTH, mode=Mode.SUBTRACT)


solid = part.part
